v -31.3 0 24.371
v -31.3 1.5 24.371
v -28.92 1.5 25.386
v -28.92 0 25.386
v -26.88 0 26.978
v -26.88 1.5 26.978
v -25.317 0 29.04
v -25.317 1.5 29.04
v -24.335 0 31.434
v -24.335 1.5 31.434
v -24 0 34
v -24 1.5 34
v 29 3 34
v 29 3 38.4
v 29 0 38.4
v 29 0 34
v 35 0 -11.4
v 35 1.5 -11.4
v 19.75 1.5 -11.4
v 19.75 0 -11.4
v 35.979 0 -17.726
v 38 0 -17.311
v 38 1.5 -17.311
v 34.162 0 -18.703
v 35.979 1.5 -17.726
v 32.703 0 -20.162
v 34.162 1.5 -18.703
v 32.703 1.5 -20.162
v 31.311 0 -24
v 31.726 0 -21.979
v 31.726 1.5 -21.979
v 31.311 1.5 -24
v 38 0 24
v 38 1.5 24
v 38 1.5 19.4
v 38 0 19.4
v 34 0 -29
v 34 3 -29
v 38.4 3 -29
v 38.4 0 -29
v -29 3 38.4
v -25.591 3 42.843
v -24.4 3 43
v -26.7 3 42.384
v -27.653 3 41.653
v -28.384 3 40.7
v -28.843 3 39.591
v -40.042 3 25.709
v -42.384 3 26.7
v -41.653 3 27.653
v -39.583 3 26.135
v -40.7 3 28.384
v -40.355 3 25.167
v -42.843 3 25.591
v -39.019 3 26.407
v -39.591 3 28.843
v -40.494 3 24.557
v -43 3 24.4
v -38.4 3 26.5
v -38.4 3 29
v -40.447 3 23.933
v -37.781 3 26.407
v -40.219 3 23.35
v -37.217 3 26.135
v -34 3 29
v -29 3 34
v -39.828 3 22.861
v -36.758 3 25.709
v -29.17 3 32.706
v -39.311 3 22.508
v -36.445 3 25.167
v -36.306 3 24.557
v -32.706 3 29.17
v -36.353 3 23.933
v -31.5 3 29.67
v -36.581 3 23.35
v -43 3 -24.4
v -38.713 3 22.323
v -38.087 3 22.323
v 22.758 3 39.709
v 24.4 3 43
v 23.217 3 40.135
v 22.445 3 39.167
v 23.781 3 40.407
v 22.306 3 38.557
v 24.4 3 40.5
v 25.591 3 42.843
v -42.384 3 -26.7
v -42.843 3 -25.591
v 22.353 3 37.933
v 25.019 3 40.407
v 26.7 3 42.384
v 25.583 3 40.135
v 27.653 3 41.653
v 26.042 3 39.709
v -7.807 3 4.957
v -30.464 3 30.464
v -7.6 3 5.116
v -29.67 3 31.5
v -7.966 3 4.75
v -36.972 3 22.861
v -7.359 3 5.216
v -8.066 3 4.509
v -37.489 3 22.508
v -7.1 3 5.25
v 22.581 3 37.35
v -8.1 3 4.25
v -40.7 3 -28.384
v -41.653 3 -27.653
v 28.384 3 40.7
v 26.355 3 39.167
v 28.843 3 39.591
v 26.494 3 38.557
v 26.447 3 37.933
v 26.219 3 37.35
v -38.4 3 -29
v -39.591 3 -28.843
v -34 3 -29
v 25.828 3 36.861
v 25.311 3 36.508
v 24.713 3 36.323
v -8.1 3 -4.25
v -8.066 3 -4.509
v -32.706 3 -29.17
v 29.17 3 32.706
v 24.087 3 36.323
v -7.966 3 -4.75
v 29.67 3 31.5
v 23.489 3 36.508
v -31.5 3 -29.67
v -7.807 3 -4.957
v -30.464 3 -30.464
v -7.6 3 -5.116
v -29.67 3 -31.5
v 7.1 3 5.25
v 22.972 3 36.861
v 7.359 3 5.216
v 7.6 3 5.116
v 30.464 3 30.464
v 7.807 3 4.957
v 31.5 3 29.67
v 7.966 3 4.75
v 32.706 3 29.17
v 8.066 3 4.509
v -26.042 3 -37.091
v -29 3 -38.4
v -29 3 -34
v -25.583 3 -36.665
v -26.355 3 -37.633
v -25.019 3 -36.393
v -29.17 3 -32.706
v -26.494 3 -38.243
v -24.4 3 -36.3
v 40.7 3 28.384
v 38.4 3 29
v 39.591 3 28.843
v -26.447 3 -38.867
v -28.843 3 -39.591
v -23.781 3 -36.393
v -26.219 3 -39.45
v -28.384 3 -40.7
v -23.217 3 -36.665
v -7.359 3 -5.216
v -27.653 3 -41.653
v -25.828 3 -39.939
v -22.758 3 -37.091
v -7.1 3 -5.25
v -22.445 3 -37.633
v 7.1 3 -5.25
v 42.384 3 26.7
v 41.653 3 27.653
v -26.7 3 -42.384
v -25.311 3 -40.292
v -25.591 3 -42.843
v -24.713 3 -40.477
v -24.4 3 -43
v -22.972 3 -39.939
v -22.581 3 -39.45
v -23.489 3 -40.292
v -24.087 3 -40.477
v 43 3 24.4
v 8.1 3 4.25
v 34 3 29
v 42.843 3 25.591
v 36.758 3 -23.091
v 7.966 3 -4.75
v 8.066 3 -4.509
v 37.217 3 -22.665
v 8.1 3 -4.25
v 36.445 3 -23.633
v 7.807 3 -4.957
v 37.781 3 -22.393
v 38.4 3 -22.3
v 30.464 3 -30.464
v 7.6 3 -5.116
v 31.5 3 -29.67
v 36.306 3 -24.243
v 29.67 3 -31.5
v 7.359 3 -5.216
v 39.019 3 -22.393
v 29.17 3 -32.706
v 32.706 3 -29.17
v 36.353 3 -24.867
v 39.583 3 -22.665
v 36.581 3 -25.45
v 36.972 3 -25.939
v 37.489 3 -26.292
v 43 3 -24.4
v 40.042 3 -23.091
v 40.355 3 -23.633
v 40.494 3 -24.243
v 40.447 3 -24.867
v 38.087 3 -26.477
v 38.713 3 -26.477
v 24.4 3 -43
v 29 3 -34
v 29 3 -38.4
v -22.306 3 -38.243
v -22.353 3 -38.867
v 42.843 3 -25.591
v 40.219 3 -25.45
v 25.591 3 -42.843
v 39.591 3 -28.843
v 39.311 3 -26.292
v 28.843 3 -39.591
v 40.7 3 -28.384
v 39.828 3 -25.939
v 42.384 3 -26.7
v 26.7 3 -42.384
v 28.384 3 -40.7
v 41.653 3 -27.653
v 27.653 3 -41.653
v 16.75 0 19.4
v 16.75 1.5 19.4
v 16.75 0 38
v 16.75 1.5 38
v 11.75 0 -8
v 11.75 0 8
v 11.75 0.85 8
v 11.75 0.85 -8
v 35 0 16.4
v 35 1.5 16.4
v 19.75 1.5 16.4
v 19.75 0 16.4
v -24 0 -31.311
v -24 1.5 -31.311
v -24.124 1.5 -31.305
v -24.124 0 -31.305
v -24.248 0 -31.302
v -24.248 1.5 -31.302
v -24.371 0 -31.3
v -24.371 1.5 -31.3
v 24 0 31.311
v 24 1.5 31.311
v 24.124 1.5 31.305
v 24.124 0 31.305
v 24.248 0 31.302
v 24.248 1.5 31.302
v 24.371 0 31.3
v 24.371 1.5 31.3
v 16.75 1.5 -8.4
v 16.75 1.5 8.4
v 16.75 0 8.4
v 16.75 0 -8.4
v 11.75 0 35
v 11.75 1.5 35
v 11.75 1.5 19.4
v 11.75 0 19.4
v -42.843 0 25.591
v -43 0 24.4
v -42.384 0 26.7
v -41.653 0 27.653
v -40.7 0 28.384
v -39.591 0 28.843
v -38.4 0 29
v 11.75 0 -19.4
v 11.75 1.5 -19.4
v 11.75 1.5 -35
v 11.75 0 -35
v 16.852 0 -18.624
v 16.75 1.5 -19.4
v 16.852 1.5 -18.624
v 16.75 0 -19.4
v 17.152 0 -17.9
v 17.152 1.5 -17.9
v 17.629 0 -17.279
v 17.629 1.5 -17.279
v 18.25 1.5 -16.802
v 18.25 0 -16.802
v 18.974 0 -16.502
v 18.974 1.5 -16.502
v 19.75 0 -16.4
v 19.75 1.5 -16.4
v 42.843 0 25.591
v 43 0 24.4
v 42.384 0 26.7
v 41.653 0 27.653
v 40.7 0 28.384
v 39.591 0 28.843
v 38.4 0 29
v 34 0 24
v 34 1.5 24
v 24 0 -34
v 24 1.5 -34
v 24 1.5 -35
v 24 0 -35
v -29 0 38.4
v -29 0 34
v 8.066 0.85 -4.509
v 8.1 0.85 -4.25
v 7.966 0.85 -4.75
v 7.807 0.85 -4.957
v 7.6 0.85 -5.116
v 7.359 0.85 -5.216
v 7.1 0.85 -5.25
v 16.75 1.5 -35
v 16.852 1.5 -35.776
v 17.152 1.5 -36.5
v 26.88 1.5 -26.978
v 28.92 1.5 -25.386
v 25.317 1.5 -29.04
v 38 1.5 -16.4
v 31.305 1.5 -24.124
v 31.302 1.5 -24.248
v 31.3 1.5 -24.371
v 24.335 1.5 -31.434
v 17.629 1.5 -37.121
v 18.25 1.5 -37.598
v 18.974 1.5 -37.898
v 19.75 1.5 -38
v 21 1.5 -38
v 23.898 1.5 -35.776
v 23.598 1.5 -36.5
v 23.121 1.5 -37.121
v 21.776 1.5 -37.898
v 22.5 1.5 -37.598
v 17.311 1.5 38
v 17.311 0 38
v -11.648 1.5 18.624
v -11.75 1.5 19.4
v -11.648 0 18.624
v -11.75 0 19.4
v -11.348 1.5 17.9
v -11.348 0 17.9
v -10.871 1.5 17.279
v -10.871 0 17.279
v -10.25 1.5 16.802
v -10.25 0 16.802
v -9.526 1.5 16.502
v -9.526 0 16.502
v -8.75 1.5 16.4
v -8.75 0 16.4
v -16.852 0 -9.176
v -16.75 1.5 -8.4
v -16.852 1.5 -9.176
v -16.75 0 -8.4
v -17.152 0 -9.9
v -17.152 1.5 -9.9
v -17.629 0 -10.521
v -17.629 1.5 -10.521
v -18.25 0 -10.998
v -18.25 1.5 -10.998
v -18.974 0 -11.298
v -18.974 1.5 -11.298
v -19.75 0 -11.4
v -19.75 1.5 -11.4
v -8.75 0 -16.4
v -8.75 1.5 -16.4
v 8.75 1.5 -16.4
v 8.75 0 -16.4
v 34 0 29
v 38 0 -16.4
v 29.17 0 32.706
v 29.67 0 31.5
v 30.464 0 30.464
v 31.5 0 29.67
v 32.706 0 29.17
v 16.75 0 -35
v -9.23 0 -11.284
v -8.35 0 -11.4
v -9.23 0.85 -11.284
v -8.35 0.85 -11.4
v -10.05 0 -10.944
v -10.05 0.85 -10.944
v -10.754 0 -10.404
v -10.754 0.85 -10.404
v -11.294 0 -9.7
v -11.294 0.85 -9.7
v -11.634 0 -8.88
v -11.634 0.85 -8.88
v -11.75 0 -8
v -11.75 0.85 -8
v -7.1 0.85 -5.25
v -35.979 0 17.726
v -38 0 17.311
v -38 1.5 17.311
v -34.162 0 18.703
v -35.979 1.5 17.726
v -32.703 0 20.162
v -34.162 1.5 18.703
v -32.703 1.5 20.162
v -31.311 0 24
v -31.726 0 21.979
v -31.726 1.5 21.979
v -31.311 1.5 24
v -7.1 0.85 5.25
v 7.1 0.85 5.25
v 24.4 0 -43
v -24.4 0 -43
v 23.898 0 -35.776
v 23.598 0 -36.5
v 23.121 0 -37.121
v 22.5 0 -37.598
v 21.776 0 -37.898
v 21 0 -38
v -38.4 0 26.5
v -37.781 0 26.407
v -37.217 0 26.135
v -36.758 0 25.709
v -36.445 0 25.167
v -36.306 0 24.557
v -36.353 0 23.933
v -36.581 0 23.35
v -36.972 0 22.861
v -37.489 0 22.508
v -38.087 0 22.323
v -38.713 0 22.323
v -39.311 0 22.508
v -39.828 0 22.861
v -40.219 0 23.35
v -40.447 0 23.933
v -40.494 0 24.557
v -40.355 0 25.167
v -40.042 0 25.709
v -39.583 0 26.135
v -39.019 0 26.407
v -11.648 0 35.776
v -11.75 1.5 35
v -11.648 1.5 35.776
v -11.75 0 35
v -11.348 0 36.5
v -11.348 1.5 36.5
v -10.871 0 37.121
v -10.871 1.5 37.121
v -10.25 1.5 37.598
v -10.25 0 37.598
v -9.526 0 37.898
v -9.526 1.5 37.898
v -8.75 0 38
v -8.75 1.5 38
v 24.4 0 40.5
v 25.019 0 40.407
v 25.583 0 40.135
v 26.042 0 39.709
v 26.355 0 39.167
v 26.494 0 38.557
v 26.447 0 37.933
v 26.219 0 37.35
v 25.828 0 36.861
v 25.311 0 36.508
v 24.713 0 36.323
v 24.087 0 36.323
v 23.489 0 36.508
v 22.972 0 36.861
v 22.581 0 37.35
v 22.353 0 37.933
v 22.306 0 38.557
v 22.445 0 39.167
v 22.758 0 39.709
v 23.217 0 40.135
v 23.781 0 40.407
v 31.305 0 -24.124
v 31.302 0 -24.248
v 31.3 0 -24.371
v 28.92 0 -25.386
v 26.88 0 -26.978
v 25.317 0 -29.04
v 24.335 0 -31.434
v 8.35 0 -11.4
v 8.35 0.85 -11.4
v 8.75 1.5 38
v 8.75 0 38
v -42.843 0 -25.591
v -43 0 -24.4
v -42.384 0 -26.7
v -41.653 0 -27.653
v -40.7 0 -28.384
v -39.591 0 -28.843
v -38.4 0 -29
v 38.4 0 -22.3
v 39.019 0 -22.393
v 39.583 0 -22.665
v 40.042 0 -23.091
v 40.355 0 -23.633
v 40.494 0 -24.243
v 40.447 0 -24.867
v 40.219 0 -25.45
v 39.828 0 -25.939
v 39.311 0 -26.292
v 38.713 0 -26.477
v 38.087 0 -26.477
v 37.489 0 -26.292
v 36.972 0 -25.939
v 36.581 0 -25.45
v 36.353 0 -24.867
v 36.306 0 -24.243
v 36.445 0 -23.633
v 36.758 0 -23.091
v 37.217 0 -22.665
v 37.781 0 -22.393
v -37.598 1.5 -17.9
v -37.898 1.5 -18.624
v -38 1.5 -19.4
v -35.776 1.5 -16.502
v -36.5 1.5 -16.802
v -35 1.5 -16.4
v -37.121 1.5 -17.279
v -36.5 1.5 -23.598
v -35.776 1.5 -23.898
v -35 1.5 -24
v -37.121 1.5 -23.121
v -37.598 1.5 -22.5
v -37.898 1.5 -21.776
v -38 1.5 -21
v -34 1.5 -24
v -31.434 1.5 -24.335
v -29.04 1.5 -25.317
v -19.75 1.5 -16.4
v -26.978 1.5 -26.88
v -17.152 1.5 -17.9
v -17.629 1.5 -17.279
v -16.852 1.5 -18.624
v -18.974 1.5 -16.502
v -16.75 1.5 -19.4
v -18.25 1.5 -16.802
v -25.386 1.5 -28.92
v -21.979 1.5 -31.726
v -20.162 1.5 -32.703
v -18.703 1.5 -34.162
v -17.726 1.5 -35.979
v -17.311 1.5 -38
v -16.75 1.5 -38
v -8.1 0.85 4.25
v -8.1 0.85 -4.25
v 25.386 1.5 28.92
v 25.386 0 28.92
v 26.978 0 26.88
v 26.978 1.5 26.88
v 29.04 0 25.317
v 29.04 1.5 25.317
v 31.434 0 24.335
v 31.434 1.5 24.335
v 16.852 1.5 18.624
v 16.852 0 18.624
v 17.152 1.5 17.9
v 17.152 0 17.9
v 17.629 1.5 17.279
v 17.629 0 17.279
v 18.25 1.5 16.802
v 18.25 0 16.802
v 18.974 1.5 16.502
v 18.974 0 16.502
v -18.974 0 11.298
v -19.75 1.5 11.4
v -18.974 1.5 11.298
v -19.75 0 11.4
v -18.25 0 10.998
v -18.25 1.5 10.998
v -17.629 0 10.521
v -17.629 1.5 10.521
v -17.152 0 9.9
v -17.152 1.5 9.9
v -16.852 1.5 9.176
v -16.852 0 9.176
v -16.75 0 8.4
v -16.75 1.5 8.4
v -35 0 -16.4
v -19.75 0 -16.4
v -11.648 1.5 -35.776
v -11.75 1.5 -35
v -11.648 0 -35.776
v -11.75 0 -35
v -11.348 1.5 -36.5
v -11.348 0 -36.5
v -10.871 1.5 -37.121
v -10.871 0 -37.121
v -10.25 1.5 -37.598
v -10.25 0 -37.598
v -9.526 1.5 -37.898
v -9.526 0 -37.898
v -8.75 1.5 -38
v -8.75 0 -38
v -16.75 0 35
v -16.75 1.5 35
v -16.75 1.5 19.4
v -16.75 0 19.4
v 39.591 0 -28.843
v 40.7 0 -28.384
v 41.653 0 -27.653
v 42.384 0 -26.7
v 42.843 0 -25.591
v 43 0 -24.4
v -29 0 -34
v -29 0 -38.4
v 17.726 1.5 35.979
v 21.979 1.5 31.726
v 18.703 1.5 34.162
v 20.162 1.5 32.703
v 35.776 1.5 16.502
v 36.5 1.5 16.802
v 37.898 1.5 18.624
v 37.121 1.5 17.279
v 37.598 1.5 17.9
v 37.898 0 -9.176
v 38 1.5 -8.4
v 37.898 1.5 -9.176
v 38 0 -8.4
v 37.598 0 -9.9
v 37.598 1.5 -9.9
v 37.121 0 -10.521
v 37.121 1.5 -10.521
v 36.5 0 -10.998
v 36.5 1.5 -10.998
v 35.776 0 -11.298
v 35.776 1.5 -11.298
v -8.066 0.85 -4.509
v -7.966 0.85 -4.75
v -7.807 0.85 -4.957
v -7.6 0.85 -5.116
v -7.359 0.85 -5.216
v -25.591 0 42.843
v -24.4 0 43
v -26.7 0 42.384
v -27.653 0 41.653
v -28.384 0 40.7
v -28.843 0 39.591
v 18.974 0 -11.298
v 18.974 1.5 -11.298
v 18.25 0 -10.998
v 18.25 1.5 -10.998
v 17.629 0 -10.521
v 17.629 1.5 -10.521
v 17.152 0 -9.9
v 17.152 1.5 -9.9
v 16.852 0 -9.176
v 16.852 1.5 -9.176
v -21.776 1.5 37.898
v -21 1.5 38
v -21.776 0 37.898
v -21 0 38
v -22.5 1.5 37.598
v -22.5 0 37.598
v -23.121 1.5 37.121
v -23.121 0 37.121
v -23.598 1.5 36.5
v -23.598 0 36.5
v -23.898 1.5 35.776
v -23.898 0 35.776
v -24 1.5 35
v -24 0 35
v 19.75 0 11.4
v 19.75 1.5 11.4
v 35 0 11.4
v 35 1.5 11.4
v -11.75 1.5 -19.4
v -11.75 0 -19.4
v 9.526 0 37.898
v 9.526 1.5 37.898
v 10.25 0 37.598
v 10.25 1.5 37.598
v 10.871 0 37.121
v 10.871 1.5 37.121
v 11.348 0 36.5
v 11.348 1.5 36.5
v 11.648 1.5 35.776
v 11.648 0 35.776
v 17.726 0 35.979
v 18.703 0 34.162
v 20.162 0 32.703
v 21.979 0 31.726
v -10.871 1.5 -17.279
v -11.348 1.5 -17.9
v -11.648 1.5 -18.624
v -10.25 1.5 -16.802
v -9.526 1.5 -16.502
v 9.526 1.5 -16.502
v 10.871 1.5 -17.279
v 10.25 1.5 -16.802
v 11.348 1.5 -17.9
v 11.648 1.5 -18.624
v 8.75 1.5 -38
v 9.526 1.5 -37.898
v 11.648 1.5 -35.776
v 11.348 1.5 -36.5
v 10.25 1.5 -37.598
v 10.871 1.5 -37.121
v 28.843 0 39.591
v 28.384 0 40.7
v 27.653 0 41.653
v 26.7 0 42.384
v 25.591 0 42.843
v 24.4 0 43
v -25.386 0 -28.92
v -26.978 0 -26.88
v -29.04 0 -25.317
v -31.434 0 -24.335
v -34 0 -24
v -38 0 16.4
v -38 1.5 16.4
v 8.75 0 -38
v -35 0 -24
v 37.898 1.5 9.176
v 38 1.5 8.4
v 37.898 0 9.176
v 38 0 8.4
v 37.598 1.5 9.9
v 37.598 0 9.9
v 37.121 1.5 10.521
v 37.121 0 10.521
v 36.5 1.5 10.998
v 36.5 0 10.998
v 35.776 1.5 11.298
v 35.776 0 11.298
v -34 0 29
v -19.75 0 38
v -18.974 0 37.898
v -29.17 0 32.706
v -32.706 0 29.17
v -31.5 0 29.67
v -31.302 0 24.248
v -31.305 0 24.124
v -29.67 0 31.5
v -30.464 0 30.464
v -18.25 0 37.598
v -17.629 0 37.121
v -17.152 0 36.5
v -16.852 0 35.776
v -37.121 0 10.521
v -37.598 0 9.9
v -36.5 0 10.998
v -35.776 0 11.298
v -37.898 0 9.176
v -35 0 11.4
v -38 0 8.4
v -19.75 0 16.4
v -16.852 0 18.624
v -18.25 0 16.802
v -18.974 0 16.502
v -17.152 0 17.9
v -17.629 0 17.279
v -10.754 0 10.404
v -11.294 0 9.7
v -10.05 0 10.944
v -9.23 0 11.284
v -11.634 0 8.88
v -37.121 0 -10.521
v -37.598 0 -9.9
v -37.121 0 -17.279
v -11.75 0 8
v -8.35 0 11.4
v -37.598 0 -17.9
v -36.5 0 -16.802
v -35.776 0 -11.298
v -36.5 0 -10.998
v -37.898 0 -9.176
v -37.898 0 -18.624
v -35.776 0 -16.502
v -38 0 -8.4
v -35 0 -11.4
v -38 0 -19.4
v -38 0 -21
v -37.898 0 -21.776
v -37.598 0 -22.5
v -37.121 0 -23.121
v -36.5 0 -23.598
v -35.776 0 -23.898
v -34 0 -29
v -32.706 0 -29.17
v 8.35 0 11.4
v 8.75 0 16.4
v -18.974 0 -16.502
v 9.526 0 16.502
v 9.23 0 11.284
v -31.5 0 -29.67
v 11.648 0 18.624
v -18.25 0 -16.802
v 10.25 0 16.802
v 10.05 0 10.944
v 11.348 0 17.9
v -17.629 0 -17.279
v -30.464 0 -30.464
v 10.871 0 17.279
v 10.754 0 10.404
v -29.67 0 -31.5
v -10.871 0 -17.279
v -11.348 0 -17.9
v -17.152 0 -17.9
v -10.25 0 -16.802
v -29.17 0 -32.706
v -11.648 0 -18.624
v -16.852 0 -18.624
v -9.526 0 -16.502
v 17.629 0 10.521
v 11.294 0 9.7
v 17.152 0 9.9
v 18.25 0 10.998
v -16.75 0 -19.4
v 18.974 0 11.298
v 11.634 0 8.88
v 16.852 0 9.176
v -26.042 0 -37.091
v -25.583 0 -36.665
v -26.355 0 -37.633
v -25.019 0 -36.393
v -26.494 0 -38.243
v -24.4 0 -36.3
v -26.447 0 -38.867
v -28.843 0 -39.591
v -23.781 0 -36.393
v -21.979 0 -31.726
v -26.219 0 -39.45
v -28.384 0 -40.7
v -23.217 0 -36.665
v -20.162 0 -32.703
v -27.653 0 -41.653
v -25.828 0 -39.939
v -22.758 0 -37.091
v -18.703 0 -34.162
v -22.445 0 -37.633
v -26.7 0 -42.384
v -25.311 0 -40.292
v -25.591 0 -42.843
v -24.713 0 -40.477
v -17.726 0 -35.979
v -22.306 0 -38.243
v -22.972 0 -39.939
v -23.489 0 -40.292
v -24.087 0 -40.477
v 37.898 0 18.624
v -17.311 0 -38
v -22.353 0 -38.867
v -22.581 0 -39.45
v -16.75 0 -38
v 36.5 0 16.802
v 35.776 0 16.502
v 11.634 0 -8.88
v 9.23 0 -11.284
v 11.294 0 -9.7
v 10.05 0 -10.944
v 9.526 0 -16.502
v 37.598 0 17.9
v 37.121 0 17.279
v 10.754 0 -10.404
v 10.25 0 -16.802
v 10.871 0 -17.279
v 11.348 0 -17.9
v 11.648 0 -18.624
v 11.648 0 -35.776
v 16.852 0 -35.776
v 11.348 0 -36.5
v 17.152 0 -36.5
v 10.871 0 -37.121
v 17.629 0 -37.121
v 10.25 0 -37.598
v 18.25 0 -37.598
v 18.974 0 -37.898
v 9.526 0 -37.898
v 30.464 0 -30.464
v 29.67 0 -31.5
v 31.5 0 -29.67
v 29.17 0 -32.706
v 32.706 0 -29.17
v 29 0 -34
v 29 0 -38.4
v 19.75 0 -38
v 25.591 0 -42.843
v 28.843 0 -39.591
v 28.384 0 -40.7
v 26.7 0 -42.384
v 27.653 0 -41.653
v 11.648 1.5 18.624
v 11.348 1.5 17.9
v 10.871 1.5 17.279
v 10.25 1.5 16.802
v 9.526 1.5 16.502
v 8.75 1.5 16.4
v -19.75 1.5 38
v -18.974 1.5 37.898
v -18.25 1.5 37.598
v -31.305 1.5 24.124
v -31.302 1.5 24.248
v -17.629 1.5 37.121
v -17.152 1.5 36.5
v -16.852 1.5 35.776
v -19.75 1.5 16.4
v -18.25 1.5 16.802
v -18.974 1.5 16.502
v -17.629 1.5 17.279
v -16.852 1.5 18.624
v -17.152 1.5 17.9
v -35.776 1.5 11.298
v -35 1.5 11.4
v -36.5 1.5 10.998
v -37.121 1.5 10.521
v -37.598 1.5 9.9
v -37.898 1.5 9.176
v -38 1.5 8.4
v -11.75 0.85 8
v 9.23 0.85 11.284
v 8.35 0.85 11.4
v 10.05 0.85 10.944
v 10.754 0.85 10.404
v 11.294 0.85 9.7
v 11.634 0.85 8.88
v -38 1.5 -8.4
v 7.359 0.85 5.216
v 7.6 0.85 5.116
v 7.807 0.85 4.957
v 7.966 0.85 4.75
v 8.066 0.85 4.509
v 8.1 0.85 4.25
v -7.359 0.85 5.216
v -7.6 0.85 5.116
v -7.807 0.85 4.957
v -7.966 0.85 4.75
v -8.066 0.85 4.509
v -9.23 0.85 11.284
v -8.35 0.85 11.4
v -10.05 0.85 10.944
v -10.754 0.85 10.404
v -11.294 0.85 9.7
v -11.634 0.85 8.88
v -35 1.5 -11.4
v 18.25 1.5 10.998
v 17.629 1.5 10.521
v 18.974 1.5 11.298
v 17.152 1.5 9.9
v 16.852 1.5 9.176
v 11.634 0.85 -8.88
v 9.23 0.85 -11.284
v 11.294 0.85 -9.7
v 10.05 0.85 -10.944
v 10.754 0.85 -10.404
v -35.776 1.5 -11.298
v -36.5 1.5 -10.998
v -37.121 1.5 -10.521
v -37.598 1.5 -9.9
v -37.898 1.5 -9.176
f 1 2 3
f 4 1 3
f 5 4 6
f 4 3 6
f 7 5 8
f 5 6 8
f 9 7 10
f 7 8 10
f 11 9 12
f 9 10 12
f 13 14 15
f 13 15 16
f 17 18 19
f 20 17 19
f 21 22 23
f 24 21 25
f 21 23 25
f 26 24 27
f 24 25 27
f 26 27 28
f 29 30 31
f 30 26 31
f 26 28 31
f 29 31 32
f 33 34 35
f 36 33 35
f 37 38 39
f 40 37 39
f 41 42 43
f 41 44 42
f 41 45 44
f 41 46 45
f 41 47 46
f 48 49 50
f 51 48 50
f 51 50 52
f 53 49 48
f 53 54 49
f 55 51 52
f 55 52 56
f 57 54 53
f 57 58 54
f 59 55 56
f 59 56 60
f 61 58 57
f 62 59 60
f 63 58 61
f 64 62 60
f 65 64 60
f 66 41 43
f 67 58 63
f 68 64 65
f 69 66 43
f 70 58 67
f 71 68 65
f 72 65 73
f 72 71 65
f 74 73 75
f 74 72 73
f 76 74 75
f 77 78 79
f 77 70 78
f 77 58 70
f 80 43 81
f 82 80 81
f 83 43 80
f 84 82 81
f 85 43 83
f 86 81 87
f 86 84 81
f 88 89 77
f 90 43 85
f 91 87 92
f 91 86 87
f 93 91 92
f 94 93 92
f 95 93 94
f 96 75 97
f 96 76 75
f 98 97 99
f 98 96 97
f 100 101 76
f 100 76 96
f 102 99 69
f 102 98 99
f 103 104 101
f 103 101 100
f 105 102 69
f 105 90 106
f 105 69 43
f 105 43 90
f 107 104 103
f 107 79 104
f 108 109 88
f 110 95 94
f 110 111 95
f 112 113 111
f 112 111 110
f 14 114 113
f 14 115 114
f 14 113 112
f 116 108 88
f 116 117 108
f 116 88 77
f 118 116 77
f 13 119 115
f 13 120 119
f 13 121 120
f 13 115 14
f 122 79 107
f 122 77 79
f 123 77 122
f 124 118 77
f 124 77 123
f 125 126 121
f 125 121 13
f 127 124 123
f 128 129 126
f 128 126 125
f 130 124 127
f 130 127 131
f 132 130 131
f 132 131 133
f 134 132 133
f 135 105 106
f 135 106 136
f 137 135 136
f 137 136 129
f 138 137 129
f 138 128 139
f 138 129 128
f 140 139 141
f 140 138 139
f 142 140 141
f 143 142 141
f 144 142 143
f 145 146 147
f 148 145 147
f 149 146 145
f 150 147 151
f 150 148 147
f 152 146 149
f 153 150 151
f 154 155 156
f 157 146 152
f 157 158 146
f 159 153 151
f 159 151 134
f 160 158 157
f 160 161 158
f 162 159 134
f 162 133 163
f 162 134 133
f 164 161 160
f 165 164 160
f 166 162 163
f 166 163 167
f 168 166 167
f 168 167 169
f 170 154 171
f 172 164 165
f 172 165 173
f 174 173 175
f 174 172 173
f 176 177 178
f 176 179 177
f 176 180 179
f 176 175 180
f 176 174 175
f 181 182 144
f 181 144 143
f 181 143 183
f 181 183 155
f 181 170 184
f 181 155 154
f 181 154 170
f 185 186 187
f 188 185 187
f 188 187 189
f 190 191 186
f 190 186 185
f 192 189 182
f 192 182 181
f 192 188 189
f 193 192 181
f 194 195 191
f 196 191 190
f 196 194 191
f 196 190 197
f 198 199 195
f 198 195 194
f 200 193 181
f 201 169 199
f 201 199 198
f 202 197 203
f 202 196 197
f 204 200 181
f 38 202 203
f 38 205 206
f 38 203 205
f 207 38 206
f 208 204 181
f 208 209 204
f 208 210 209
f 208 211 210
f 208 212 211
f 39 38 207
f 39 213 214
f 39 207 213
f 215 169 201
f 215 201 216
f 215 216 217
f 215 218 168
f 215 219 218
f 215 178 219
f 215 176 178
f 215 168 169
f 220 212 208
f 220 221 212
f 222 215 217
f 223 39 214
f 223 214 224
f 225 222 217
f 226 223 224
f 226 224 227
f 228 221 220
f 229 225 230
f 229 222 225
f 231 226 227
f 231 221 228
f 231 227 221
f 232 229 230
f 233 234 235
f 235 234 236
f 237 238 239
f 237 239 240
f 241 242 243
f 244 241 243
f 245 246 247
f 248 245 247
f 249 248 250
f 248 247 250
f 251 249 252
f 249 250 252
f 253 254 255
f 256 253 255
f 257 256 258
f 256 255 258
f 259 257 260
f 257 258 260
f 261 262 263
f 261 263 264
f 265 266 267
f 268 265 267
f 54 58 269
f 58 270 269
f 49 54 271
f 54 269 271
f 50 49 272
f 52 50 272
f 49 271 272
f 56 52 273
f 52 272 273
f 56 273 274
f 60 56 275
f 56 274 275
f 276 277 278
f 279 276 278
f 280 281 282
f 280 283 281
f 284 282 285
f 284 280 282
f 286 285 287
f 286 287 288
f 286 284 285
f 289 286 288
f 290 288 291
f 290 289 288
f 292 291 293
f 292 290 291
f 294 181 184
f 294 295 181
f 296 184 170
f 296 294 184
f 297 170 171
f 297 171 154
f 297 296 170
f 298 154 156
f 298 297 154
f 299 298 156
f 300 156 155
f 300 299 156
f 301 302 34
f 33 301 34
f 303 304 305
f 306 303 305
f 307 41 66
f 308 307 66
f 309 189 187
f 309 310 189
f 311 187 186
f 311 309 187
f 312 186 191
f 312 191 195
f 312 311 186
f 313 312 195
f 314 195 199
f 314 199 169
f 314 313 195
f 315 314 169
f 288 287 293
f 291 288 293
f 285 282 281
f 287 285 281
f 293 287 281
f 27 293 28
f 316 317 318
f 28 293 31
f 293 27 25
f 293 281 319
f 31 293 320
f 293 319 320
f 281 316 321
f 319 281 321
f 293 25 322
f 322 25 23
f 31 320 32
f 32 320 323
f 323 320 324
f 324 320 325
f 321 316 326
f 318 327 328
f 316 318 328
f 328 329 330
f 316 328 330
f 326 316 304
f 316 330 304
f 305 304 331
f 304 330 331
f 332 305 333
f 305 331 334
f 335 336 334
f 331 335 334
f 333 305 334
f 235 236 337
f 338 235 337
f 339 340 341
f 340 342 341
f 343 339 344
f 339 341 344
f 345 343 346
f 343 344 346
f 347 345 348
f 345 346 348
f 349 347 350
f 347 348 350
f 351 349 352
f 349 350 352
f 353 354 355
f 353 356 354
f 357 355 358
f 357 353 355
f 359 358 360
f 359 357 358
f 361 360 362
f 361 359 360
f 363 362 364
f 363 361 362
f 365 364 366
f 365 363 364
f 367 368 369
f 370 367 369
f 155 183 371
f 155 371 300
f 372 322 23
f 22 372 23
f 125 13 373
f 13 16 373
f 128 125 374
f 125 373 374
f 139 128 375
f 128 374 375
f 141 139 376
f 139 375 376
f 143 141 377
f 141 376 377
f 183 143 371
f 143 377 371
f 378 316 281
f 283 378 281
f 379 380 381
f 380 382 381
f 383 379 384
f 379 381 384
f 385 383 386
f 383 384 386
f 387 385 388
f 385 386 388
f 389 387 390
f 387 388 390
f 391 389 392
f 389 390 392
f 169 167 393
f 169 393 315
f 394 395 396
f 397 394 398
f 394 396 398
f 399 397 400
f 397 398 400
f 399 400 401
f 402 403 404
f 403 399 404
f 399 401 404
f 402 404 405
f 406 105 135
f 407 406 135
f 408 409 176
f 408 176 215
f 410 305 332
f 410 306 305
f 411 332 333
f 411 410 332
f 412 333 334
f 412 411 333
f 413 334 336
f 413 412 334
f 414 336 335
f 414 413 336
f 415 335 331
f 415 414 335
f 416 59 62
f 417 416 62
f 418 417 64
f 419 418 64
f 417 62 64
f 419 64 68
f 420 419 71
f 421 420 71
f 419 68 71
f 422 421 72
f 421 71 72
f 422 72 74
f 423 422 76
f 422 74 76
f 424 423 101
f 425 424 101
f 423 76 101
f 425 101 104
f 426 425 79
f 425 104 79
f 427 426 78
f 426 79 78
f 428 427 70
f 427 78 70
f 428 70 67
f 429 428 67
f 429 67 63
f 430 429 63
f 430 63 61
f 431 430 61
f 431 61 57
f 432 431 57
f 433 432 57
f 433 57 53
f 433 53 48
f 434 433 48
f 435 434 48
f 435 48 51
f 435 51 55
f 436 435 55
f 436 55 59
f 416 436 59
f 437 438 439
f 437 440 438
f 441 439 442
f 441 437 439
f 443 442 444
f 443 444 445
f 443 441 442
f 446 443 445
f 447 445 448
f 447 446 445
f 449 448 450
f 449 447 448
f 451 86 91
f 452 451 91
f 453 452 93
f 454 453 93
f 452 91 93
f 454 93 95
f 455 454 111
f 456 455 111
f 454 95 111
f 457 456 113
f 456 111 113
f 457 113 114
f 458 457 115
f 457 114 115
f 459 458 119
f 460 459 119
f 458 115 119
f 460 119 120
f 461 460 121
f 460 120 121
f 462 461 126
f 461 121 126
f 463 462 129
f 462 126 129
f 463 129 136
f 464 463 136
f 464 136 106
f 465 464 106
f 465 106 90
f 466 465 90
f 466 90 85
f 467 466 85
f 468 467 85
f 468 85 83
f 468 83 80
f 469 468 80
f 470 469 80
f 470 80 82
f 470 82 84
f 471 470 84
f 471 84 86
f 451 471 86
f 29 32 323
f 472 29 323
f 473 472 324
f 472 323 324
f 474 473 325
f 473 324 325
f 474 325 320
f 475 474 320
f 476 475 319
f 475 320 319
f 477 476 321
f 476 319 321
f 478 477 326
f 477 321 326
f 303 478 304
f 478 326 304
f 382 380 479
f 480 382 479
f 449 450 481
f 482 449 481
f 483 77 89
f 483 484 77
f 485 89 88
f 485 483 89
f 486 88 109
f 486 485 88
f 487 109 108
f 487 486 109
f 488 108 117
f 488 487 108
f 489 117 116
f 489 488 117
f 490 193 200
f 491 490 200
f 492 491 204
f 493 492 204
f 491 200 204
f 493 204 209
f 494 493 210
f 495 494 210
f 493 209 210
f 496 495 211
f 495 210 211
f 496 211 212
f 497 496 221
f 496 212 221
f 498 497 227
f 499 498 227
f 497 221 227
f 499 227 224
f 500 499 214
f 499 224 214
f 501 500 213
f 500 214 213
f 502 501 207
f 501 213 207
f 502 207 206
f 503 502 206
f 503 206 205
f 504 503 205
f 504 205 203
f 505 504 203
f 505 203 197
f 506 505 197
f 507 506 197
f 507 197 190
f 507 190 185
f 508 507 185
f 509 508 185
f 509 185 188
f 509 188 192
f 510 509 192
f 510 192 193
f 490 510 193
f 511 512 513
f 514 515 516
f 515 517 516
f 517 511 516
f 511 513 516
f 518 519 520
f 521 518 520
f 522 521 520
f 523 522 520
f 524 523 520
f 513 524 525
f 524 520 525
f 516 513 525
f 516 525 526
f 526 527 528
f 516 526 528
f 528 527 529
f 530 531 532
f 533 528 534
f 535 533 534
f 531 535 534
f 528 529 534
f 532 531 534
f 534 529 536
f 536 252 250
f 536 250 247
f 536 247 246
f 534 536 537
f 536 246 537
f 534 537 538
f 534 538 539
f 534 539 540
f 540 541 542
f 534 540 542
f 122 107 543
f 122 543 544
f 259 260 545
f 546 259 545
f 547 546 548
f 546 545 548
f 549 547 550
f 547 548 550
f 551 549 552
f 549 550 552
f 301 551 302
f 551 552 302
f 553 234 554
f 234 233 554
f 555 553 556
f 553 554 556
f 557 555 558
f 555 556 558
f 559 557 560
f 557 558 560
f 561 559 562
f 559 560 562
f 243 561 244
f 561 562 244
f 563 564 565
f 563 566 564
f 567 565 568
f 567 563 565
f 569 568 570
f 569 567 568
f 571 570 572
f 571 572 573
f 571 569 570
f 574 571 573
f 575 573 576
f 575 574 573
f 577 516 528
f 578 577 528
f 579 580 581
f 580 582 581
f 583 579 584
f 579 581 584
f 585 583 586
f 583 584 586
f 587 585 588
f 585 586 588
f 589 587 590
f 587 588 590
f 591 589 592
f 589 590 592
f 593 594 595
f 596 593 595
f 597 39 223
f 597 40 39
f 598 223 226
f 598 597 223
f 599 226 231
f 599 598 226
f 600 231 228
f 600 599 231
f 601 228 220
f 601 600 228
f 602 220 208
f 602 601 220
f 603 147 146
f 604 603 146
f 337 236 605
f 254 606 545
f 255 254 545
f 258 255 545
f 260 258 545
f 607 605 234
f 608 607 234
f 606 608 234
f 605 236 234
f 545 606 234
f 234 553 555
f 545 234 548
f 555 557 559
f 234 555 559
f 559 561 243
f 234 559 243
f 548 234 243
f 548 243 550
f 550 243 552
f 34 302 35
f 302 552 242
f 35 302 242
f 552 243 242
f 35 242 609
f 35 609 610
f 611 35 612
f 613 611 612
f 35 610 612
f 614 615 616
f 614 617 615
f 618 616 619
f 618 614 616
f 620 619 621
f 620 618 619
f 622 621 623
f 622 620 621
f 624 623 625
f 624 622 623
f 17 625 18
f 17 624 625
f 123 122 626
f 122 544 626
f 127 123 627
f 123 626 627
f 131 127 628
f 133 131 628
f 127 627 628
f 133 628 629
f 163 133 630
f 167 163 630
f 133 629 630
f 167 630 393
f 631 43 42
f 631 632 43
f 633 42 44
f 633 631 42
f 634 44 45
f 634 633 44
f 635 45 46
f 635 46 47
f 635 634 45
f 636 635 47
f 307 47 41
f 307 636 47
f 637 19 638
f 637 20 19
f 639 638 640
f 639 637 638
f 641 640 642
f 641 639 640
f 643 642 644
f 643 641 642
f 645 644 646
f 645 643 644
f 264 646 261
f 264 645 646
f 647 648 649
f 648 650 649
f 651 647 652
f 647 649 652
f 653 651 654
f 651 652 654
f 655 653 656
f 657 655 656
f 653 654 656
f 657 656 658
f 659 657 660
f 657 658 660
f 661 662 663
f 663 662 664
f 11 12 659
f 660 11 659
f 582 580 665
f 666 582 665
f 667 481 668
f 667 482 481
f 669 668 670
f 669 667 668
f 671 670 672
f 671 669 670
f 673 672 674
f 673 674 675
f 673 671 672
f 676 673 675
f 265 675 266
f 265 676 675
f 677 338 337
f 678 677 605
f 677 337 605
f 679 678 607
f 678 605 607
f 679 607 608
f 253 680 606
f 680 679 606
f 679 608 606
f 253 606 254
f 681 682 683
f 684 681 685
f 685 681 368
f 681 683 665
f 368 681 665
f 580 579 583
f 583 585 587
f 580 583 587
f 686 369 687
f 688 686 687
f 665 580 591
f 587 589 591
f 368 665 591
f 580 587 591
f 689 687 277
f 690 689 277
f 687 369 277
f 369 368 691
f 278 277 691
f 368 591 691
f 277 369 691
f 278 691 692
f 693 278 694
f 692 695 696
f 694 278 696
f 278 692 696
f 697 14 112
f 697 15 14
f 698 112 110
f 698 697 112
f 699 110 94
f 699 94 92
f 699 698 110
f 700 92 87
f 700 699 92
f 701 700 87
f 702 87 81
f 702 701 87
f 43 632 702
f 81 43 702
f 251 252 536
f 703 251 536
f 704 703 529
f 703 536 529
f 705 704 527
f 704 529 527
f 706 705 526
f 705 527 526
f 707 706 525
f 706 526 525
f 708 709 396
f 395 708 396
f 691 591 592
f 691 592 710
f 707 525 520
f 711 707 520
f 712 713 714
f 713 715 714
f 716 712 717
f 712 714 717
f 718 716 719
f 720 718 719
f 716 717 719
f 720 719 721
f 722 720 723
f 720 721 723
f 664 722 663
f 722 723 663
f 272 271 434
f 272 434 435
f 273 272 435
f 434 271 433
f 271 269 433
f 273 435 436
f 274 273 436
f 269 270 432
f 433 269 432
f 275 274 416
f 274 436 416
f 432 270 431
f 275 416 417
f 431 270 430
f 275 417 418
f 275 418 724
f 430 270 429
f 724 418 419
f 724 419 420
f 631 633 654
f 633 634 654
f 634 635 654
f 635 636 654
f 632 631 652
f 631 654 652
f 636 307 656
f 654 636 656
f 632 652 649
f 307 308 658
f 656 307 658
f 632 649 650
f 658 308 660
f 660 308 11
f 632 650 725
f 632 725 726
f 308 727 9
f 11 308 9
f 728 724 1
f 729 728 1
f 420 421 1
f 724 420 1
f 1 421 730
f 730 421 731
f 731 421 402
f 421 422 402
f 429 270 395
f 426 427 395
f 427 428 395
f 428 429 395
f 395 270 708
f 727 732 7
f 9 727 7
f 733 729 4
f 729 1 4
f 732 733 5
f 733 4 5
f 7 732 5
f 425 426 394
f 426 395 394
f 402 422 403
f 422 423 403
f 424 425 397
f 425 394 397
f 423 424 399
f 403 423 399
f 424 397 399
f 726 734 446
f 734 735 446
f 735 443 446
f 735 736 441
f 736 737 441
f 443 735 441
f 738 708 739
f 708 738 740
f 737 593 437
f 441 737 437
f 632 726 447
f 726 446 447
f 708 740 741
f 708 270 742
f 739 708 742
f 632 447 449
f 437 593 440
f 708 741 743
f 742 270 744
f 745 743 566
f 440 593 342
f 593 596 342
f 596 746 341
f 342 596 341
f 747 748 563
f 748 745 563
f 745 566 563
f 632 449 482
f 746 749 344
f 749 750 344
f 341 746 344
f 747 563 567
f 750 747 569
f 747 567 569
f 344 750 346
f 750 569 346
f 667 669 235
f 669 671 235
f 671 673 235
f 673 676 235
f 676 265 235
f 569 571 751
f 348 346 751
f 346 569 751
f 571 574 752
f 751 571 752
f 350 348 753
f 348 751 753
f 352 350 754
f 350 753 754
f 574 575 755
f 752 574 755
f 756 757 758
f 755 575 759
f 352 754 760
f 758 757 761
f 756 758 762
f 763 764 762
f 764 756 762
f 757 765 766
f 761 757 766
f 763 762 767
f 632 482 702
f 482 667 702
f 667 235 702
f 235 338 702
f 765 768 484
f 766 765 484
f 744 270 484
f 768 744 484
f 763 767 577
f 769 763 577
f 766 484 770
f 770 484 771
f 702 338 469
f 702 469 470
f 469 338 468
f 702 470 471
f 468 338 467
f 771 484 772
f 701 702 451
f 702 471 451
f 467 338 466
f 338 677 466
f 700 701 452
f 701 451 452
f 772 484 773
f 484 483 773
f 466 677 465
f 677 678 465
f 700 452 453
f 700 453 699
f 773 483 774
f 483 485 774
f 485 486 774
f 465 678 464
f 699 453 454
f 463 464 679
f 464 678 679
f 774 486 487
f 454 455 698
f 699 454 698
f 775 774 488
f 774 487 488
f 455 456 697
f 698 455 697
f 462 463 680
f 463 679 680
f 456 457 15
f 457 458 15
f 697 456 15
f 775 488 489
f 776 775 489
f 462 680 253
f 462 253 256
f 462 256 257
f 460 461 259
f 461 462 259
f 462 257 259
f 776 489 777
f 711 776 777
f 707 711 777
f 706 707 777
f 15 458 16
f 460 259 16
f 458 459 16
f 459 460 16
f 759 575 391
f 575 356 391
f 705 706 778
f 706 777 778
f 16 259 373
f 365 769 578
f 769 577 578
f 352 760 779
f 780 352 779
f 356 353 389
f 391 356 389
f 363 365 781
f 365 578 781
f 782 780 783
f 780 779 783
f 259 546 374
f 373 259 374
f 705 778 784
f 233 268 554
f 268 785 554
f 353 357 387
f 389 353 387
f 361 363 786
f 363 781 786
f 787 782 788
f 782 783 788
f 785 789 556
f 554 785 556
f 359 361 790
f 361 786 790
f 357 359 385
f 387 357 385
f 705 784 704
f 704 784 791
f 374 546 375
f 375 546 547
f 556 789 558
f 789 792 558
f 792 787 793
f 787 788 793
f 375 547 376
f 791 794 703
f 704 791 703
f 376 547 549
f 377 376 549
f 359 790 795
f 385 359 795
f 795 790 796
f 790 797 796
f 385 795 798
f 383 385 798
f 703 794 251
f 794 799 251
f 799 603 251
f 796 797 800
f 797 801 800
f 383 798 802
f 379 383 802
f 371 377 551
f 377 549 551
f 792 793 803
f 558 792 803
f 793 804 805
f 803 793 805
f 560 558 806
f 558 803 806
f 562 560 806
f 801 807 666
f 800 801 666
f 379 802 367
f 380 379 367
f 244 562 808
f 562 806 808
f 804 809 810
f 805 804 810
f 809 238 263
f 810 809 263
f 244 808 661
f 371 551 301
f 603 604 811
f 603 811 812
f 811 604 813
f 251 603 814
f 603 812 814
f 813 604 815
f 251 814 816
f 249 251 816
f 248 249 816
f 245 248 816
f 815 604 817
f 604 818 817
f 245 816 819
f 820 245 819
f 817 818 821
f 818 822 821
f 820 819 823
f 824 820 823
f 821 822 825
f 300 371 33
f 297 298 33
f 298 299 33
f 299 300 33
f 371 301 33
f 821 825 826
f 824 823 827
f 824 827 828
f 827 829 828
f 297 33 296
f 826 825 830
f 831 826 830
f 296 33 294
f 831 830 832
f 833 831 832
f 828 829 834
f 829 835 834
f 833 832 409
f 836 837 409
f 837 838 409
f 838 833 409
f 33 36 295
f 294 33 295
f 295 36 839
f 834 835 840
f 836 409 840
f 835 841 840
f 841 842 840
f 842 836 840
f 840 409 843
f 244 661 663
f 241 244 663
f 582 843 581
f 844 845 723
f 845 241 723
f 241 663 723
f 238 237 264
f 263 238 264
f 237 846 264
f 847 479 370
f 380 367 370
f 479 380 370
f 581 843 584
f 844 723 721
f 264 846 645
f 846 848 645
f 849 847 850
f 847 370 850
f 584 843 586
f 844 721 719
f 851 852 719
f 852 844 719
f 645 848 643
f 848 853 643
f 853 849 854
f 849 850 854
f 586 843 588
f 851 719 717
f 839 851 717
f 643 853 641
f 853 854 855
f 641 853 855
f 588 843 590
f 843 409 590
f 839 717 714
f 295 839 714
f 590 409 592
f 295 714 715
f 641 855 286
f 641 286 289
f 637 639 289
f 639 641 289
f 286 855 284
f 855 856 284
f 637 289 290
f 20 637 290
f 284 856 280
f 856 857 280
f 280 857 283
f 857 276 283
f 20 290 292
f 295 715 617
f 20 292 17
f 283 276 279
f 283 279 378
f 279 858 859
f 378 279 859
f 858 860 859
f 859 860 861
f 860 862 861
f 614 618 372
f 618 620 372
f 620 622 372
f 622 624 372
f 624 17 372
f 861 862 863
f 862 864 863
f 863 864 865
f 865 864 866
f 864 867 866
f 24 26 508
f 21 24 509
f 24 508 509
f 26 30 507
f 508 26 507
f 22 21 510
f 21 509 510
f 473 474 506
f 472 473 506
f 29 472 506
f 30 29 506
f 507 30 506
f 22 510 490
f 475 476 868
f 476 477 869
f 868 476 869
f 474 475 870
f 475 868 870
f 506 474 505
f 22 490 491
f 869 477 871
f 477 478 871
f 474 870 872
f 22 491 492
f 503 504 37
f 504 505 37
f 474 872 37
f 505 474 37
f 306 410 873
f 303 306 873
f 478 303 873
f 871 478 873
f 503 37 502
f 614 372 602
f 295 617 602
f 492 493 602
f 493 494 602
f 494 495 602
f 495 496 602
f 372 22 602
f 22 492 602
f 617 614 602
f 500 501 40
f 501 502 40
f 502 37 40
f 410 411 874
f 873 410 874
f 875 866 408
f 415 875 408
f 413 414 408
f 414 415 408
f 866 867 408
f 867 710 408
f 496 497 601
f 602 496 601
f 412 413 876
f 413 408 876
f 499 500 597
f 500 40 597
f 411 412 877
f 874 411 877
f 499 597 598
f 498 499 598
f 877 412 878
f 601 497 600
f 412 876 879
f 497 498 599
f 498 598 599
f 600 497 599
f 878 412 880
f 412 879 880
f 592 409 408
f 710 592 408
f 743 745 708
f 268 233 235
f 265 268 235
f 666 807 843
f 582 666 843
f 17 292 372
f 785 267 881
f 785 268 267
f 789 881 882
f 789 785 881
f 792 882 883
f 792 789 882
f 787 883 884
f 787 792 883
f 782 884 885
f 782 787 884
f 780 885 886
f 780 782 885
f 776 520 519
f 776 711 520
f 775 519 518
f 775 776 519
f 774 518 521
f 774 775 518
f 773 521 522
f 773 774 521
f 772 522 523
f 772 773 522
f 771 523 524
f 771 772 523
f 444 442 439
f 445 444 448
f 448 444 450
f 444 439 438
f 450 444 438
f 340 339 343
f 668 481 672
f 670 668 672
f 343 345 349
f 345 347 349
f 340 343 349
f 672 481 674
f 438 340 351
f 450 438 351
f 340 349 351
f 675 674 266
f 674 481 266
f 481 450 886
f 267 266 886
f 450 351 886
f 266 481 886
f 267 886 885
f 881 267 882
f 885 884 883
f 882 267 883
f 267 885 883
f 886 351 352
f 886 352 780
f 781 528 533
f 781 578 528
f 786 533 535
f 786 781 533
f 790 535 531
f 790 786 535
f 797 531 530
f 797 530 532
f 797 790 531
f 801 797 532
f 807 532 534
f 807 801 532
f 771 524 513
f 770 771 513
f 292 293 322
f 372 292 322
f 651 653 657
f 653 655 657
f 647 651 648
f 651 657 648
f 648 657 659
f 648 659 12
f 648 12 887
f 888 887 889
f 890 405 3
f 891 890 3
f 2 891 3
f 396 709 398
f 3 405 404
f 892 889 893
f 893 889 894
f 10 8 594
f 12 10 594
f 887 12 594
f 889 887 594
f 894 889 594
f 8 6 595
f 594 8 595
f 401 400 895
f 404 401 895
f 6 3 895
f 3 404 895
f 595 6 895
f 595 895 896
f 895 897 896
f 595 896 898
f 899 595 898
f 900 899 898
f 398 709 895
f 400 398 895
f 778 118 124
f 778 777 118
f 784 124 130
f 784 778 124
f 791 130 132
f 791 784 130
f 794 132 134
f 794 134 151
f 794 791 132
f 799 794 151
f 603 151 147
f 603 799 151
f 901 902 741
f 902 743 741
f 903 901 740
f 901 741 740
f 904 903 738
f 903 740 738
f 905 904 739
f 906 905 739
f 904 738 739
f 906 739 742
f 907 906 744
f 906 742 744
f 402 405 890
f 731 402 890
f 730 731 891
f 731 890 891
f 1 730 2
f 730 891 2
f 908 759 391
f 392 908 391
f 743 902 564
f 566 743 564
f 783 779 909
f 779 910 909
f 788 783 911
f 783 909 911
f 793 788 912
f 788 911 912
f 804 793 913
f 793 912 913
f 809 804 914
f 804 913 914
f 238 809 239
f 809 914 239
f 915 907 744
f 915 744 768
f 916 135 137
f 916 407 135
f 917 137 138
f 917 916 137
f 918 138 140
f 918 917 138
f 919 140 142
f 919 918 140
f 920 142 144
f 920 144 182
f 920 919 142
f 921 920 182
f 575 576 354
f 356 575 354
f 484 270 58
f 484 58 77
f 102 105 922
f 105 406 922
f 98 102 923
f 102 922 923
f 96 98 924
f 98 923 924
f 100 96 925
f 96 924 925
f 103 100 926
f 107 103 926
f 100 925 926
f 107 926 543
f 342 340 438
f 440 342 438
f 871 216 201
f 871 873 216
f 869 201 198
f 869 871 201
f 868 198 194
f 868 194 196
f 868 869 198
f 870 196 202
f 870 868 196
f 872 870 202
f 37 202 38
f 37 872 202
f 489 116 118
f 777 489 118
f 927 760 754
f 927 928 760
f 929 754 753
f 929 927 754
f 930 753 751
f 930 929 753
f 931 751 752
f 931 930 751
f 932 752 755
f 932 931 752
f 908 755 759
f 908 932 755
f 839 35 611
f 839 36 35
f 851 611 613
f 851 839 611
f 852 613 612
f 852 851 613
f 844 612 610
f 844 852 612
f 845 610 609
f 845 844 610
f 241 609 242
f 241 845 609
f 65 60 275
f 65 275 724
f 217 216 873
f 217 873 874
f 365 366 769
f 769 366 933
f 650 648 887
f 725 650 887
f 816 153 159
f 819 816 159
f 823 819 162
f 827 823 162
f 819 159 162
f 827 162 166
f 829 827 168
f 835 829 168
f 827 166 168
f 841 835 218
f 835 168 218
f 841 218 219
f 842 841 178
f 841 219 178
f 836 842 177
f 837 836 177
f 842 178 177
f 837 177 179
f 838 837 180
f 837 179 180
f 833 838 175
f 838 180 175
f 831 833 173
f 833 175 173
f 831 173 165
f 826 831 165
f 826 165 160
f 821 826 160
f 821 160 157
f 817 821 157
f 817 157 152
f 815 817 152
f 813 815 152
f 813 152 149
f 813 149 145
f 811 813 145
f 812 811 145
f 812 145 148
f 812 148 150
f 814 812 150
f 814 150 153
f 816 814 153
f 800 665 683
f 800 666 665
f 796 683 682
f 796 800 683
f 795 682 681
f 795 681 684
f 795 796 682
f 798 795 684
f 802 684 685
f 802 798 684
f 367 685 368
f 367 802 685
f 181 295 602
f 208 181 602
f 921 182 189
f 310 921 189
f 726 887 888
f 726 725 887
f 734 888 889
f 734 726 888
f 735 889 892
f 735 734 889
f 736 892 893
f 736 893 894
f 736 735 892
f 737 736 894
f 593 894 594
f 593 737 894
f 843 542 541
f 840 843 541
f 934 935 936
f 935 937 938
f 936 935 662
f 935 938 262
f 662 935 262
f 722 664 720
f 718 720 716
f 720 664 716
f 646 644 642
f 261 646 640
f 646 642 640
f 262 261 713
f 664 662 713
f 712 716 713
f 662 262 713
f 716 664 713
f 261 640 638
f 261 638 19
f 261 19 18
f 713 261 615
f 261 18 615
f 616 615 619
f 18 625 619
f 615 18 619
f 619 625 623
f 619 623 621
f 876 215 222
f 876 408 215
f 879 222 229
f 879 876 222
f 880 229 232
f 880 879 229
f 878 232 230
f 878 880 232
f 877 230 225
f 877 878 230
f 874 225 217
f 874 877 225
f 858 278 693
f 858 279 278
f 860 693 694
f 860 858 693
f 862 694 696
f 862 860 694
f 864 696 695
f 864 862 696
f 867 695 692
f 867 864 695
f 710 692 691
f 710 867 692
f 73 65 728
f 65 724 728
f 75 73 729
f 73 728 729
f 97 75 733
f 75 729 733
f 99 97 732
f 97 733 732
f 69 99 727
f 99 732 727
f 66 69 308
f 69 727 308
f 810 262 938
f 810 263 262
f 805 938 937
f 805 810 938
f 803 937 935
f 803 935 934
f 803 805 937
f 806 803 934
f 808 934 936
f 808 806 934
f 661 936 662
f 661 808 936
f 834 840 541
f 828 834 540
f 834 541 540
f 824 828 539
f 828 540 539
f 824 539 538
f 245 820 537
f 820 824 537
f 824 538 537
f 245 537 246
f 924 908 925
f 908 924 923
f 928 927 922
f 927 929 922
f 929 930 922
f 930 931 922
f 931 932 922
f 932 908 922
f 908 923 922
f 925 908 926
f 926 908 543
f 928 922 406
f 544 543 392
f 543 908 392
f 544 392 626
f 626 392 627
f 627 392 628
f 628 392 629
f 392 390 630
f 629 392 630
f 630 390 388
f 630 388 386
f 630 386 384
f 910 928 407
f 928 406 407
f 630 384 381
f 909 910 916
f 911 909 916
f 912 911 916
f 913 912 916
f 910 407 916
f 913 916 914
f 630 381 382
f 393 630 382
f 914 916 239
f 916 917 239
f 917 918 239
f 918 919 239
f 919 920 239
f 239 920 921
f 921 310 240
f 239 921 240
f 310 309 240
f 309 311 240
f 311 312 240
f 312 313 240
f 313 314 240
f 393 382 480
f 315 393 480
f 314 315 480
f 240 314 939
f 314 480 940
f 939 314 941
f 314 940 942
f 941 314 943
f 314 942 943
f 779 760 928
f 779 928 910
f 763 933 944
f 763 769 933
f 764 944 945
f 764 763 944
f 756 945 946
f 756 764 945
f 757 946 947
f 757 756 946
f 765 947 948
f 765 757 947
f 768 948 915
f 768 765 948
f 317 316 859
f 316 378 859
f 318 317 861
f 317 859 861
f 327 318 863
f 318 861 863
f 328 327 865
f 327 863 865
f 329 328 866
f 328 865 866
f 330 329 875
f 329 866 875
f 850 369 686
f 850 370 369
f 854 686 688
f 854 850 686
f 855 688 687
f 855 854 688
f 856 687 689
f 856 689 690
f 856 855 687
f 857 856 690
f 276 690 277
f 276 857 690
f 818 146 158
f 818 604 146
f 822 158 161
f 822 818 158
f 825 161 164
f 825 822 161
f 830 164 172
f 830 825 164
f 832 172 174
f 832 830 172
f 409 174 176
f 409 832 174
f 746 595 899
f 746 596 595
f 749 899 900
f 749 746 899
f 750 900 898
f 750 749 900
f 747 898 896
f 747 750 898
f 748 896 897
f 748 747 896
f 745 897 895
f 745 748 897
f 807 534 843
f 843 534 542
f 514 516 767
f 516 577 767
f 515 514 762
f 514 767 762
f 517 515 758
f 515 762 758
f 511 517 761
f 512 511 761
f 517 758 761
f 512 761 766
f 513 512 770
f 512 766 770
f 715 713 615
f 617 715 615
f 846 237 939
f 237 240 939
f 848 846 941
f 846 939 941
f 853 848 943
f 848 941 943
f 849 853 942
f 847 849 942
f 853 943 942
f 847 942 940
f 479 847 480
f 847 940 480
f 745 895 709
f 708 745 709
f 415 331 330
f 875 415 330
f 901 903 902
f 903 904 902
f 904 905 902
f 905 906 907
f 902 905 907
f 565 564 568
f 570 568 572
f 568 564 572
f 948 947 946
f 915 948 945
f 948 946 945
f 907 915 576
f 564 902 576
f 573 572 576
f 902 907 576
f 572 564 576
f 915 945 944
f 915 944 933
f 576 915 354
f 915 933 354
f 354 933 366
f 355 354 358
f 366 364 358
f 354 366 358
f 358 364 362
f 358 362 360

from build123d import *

# Parameters (mm, degrees)
SKETCH1_W           = 86
SKETCH1_H           = 86
BOSS_EXTRUDE1_DEPTH = 3
SKETCH2_W           = 14
SKETCH2_H           = 14
SKETCH2_W_2         = 16.2
SKETCH2_H_2         = 10.5
CUT_EXTRUDE1_DEPTH  = 61.88513776
FILLET1_R           = 4.6
FILLET2_R           = 5
SKETCH3_R           = 2.1
CUT_EXTRUDE2_DEPTH  = 61.88513776
CUT_EXTRUDE3_START  = -3
SKETCH4_W           = 23.5
SKETCH4_H           = 22.8
CUT_EXTRUDE3_DEPTH  = 0.85
FILLET3_R           = 3.4
CUT_EXTRUDE4_START  = -1.5
SKETCH5_W           = 23.5
SKETCH5_H           = 14
SKETCH5_H_2         = 7.6
SKETCH5_W_2         = 14
SKETCH5_H_3         = 22.8
SKETCH5_W_3         = 7.25
CUT_EXTRUDE4_DEPTH  = 60.38513776
FILLET4_R           = 3
FILLET5_R           = 1


with BuildPart() as part:
    # Sketch1 → Boss-Extrude1 (new body)
    with BuildSketch(Plane(origin=(0, 0, 0), x_dir=(1, 0, 0), z_dir=(0, 1, 0))):
        Rectangle(SKETCH1_W, SKETCH1_H)
    extrude(amount=BOSS_EXTRUDE1_DEPTH)

    # Sketch2 → Cut-Extrude1 (cut, through all)
    with BuildSketch(Plane(origin=(0, 3, 0), x_dir=(1, 0, 0), z_dir=(0, 1, 0))):
        with Locations((36, 36)):
            Rectangle(SKETCH2_W, SKETCH2_H)
        with Locations((-36, 36)):
            Rectangle(SKETCH2_W, SKETCH2_H)
        with Locations((36, -36)):
            Rectangle(SKETCH2_W, SKETCH2_H)
        with Locations((-36, -36)):
            Rectangle(SKETCH2_W, SKETCH2_H)
        Rectangle(SKETCH2_W_2, SKETCH2_H_2)
    extrude(amount=-CUT_EXTRUDE1_DEPTH, mode=Mode.SUBTRACT)

    # Fillet1
    fillet1_edges = [part.edges().sort_by_distance(p)[0] for p in [
        (-43, 1.5, 29),
        (-29, 1.5, 43),
        (43, 1.5, 29),
        (29, 1.5, 43),
        (29, 1.5, -43),
        (43, 1.5, -29),
        (-43, 1.5, -29),
        (-29, 1.5, -43),
    ]]
    fillet(fillet1_edges, radius=FILLET1_R)

    # Fillet2
    fillet2_edges = [part.edges().sort_by_distance(p)[0] for p in [
        (-29, 1.5, 29),
        (29, 1.5, 29),
        (29, 1.5, -29),
        (-29, 1.5, -29),
    ]]
    fillet(fillet2_edges, radius=FILLET2_R)

    # Sketch3 → Cut-Extrude2 (cut, through all)
    with BuildSketch(Plane(origin=(0, 3, 0), x_dir=(1, 0, 0), z_dir=(0, 1, 0))):
        with Locations(Location((38.4, 24.4, 0), (0, 0, 270))):
            Circle(SKETCH3_R)
        with Locations(Location((-24.4, 38.4, 0), (0, 0, 270))):
            Circle(SKETCH3_R)
        with Locations(Location((24.4, -38.4, 0), (0, 0, 270))):
            Circle(SKETCH3_R)
        with Locations(Location((-38.4, -24.4, 0), (0, 0, 270))):
            Circle(SKETCH3_R)
    extrude(amount=-CUT_EXTRUDE2_DEPTH, mode=Mode.SUBTRACT)

    # Sketch4 → Cut-Extrude3 (cut)
    with BuildSketch(Plane(origin=(0, 3, 0), x_dir=(1, 0, 0), z_dir=(0, 1, 0)).offset(CUT_EXTRUDE3_START)):
        Rectangle(SKETCH4_W, SKETCH4_H)
    extrude(amount=CUT_EXTRUDE3_DEPTH, mode=Mode.SUBTRACT)

    # Fillet3
    fillet3_edges = [part.edges().sort_by_distance(p)[0] for p in [
        (-11.75, 0.425, 11.4),
        (11.75, 0.425, 11.4),
        (11.75, 0.425, -11.4),
        (-11.75, 0.425, -11.4),
    ]]
    fillet(fillet3_edges, radius=FILLET3_R)

    # Sketch5 → Cut-Extrude4 (cut, through all)
    with BuildSketch(Plane(origin=(0, 3, 0), x_dir=(1, 0, 0), z_dir=(0, 1, 0)).offset(CUT_EXTRUDE4_START)):
        with Locations((0, 31)):
            Rectangle(SKETCH5_W, SKETCH5_H)
        with Locations((0, 20.2)):
            Rectangle(SKETCH5_W, SKETCH5_H_2)
        with Locations((-31, 0)):
            Rectangle(SKETCH5_W_2, SKETCH5_H_3)
        with Locations((-20.375, 0)):
            Rectangle(SKETCH5_W_3, SKETCH5_H_3)
        with Locations((31, 0)):
            Rectangle(SKETCH5_W_2, SKETCH5_H_3)
        with Locations((20.375, 0)):
            Rectangle(SKETCH5_W_3, SKETCH5_H_3)
        with Locations((0, -20.2)):
            Rectangle(SKETCH5_W, SKETCH5_H_2)
        with Locations((0, -31)):
            Rectangle(SKETCH5_W, SKETCH5_H)
        with Locations((20.375, -20.2)):
            Rectangle(SKETCH5_W_3, SKETCH5_H_2)
        Polygon((24, -16.4), (24, -24), (34, -24), (38, -24), (38, -16.4), align=None)
        with BuildLine():
            Line((24, -24), (16.75, -24))
            Line((16.75, -24), (16.75, -38))
            Line((16.75, -38), (17.311276561, -38))
            ThreePointArc((17.311276561, -38), (19.379541854, -33.379541854), (24, -31.311276561))
            Line((24, -31.311276561), (24, -24))
        make_face()
        with BuildLine():
            Line((34, -24), (24, -24))
            Line((24, -24), (24, -31.311276561))
            ThreePointArc((24, -31.311276561), (24.185616902, -31.303237366), (24.371380604, -31.300057681))
            ThreePointArc((24.371380604, -31.300057681), (27.958453145, -26.031329371), (34, -24))
        make_face()
        Polygon((-16.75, -24), (-24, -24), (-24, -34), (-24, -38), (-16.75, -38), align=None)
        with Locations((-20.375, -20.2)):
            Rectangle(SKETCH5_W_3, SKETCH5_H_2)
        with BuildLine():
            Line((-24, -24), (-24, -16.4))
            Line((-24, -16.4), (-38, -16.4))
            Line((-38, -16.4), (-38, -17.311276561))
            ThreePointArc((-38, -17.311276561), (-33.379541854, -19.379541854), (-31.311276561, -24))
            Line((-31.311276561, -24), (-24, -24))
        make_face()
        with BuildLine():
            Line((-24, -34), (-24, -24))
            Line((-24, -24), (-31.311276561, -24))
            ThreePointArc((-31.311276561, -24), (-31.303237366, -24.185616902), (-31.300057681, -24.371380604))
            ThreePointArc((-31.300057681, -24.371380604), (-26.031329371, -27.958453145), (-24, -34))
        make_face()
        Polygon((-38, 16.4), (-24, 16.4), (-24, 24), (-34, 24), (-38, 24), align=None)
        with BuildLine():
            Line((-24, 31.311276561), (-24, 24))
            Line((-24, 24), (-16.75, 24))
            Line((-16.75, 24), (-16.75, 38))
            Line((-16.75, 38), (-17.311276561, 38))
            ThreePointArc((-17.311276561, 38), (-19.379541854, 33.379541854), (-24, 31.311276561))
        make_face()
        with Locations((-20.375, 20.2)):
            Rectangle(SKETCH5_W_3, SKETCH5_H_2)
        with BuildLine():
            Line((-34, 24), (-24, 24))
            Line((-24, 24), (-24, 31.311276561))
            ThreePointArc((-24, 31.311276561), (-24.185616902, 31.303237366), (-24.371380604, 31.300057681))
            ThreePointArc((-24.371380604, 31.300057681), (-27.958453145, 26.031329371), (-34, 24))
        make_face()
        Polygon((16.75, 38), (16.75, 24), (24, 24), (24, 34), (24, 38), align=None)
        with Locations((20.375, 20.2)):
            Rectangle(SKETCH5_W_3, SKETCH5_H_2)
        with BuildLine():
            Line((31.311276561, 24), (24, 24))
            Line((24, 24), (24, 16.4))
            Line((24, 16.4), (38, 16.4))
            Line((38, 16.4), (38, 17.311276561))
            ThreePointArc((38, 17.311276561), (33.379541854, 19.379541854), (31.311276561, 24))
        make_face()
        with BuildLine():
            Line((24, 34), (24, 24))
            Line((24, 24), (31.311276561, 24))
            ThreePointArc((31.311276561, 24), (31.303237366, 24.185616902), (31.300057681, 24.371380604))
            ThreePointArc((31.300057681, 24.371380604), (26.031329371, 27.958453145), (24, 34))
        make_face()
    extrude(amount=-CUT_EXTRUDE4_DEPTH, mode=Mode.SUBTRACT)

    # Fillet4
    fillet4_edges = [part.edges().sort_by_distance(p)[0] for p in [
        (-16.75, 0.75, 11.4),
        (-38, 0.75, 11.4),
        (-38, 0.75, -11.4),
        (-16.75, 0.75, -11.4),
        (16.75, 0.75, -11.4),
        (38, 0.75, -11.4),
        (38, 0.75, 11.4),
        (16.75, 0.75, 11.4),
        (-11.75, 0.75, 38),
        (-11.75, 0.75, 16.4),
        (11.75, 0.75, 16.4),
        (11.75, 0.75, 38),
        (16.75, 0.75, 16.4),
        (38, 0.75, 16.4),
        (-16.75, 0.75, 16.4),
        (-16.75, 0.75, 38),
        (-24, 0.75, 38),
        (-38, 0.75, -24),
        (-16.75, 0.75, -16.4),
        (-38, 0.75, -16.4),
        (16.75, 0.75, -16.4),
        (16.75, 0.75, -38),
        (24, 0.75, -38),
        (-11.75, 0.75, -16.4),
        (-11.75, 0.75, -38),
        (11.75, 0.75, -38),
        (11.75, 0.75, -16.4),
    ]]
    fillet(fillet4_edges, radius=FILLET4_R)

    # Fillet5
    fillet5_edges = [part.edges().sort_by_distance(p)[0] for p in [
        (-8.1, 1.925, -5.25),
        (8.1, 1.925, -5.25),
        (-8.1, 1.925, 5.25),
        (8.1, 1.925, 5.25),
    ]]
    fillet(fillet5_edges, radius=FILLET5_R)


solid = part.part
